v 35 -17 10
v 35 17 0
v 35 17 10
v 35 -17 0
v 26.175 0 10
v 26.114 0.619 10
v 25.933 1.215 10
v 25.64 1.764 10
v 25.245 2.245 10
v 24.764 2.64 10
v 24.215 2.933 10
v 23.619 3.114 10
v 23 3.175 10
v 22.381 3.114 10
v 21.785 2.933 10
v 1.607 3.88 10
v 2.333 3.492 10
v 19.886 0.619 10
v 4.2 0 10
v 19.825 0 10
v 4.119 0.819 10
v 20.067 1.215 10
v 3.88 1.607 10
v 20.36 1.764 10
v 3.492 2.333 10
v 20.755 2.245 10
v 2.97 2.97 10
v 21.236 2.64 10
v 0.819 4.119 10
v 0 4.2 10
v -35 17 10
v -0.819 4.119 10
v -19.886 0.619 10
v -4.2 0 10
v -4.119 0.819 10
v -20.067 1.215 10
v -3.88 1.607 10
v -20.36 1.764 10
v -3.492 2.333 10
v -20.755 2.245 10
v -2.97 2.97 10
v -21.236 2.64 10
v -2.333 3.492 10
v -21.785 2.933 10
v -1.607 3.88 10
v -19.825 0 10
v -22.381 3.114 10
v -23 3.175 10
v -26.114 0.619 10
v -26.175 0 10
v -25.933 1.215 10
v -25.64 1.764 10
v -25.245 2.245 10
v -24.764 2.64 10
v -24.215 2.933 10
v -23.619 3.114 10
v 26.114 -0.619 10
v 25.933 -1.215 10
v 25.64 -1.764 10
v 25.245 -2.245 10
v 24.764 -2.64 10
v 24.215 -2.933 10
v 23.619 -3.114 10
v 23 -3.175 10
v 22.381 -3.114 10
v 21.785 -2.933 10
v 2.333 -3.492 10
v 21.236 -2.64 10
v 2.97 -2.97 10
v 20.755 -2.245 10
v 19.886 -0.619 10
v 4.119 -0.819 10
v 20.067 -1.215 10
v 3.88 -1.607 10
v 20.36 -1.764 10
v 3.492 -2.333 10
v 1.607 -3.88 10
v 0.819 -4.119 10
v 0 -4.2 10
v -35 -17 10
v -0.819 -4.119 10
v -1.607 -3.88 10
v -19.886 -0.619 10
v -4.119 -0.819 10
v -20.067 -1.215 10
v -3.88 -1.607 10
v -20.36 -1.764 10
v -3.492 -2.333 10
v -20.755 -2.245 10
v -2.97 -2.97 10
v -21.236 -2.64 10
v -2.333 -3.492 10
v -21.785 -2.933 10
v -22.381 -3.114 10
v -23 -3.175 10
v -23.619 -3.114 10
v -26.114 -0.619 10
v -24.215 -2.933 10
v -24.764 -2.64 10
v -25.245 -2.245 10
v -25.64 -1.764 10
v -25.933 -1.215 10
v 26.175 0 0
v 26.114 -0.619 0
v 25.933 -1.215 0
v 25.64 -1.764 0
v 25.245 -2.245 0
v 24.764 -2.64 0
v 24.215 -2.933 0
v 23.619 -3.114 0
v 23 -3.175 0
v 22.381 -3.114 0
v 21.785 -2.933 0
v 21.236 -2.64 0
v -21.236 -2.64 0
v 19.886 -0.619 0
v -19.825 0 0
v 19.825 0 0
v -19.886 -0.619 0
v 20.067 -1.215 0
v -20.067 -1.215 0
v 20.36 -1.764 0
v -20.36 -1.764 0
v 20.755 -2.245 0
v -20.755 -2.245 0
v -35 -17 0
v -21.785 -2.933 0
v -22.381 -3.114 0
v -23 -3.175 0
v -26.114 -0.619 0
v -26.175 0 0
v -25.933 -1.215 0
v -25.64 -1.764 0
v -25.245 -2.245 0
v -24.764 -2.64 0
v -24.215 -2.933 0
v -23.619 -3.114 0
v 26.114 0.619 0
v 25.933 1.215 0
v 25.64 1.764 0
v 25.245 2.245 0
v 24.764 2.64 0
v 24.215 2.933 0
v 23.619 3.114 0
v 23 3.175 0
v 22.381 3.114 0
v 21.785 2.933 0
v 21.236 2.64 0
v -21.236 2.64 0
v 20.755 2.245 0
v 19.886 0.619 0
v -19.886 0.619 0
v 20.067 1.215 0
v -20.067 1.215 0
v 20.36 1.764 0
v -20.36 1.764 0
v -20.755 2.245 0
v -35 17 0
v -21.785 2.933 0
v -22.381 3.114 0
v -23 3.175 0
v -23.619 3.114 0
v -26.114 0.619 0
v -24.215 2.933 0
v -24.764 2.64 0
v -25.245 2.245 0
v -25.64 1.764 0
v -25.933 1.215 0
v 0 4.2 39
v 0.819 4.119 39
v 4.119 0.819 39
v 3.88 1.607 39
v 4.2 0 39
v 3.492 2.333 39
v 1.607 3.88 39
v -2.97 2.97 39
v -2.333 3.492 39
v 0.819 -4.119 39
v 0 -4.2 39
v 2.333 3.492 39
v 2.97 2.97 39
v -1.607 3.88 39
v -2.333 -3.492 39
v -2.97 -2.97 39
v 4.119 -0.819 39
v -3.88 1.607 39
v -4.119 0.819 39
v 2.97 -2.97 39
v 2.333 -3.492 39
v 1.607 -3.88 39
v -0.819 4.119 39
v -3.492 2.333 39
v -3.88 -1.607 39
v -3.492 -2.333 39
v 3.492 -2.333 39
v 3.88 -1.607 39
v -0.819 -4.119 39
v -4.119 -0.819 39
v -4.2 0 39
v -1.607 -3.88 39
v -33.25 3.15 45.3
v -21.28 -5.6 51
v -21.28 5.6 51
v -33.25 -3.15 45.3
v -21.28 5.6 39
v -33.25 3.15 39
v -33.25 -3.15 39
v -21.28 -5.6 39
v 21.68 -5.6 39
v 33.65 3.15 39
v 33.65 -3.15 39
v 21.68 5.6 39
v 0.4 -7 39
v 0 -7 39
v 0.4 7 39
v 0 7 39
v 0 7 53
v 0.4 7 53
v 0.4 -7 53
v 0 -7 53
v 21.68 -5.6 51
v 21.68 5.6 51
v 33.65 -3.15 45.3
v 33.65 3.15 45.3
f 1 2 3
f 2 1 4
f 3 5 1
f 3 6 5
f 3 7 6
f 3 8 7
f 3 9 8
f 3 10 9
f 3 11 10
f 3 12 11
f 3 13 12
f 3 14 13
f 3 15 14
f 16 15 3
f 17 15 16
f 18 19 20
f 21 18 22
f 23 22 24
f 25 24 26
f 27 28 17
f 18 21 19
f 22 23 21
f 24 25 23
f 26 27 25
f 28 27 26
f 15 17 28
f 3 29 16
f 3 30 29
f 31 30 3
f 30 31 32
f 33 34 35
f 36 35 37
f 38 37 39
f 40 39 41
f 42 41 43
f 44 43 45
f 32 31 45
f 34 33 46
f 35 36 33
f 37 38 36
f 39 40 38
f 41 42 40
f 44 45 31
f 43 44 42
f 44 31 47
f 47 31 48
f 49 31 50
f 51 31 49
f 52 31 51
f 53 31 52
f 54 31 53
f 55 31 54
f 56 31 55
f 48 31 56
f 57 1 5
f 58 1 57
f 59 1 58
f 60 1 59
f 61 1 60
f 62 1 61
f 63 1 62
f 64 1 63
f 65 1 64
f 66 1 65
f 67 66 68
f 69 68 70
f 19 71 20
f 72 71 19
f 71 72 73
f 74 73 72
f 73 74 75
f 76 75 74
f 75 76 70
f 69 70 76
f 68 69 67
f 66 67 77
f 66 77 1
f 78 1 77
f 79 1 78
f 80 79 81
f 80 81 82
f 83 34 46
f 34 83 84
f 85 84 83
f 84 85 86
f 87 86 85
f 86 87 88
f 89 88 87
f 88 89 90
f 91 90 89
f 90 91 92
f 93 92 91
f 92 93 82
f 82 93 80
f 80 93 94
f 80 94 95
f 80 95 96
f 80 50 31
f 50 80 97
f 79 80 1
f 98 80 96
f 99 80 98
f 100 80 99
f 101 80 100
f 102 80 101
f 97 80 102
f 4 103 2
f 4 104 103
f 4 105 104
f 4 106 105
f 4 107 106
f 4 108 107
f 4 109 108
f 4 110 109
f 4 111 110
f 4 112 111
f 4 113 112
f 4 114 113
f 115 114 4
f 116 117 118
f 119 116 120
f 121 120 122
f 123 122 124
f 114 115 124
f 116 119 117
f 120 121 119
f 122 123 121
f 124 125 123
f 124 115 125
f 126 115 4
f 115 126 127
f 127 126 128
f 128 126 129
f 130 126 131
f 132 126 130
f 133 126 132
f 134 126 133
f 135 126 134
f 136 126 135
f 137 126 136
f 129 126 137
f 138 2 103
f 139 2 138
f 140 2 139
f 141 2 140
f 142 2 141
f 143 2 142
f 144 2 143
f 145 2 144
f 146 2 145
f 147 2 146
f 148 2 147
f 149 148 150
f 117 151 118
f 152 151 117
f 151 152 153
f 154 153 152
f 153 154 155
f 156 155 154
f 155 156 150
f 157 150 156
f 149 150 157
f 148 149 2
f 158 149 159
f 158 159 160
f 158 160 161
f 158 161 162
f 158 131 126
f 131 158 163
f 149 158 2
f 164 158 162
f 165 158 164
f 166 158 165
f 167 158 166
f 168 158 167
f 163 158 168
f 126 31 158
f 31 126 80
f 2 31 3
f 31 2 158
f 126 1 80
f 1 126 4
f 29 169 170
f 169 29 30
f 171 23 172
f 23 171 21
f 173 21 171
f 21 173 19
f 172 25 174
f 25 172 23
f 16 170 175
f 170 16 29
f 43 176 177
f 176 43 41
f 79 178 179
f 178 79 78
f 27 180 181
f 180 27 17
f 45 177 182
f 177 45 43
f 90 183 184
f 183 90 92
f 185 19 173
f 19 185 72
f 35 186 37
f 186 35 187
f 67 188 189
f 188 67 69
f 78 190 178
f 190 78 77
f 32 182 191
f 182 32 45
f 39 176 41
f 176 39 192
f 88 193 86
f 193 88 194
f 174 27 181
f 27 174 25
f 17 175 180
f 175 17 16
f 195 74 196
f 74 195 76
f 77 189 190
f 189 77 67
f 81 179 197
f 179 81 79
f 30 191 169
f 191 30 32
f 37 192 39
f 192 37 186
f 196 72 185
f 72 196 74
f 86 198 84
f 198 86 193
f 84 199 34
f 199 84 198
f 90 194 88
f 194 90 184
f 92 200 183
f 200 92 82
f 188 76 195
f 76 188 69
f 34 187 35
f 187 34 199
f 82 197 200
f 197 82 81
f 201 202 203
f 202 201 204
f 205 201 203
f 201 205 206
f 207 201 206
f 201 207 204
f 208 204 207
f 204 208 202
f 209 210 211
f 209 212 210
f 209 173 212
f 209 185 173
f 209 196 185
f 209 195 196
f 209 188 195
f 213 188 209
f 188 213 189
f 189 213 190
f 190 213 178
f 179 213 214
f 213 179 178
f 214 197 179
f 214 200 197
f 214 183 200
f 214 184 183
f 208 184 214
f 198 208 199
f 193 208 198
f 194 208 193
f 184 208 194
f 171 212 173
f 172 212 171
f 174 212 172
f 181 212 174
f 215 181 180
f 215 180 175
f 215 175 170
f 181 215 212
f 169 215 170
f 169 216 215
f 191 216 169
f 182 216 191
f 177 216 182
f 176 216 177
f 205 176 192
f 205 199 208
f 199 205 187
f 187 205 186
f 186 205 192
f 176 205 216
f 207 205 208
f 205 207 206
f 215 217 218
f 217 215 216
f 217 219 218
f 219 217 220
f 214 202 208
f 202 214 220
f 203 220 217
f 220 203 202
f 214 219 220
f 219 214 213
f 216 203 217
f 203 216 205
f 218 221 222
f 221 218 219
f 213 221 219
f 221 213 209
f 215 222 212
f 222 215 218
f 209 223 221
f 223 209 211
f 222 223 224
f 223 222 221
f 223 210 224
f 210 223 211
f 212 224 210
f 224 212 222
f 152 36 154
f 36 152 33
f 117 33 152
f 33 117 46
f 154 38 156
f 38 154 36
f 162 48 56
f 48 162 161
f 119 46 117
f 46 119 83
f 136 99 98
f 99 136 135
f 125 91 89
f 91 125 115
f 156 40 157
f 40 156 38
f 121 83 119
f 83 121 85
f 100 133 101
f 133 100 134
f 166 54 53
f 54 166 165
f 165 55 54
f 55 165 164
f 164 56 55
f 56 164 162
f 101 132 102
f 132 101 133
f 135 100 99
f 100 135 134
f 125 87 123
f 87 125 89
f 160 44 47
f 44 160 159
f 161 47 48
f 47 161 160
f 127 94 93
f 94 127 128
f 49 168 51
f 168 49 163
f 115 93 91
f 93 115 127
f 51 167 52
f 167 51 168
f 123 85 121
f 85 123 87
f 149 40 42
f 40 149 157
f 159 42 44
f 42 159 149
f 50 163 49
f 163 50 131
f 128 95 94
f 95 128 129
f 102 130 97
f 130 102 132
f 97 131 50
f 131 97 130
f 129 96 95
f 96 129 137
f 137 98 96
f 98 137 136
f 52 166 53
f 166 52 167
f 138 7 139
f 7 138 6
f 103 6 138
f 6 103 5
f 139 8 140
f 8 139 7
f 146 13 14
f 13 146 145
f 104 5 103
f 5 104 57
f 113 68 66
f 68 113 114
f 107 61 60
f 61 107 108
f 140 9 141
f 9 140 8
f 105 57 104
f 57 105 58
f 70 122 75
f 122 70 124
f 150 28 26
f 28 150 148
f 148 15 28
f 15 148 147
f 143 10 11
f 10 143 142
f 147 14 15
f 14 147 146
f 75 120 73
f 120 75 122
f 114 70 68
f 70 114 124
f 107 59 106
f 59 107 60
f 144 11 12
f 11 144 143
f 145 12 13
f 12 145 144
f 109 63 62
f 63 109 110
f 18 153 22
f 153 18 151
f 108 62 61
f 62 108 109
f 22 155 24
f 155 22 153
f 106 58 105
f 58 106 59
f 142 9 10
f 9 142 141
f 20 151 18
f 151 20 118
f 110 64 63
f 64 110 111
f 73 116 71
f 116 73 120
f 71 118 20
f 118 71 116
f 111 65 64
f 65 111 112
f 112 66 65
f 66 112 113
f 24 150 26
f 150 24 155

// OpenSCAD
$fn = 32;

// ----------------------------------------------------------------------
// Boat cleat: 70 mm base, horn 46 mm up
// ----------------------------------------------------------------------

// --- parameters (mm) ---
base_l = 70;              // base length
base_w = 34;              // base width
base_t = 10;              // base thickness
horn_len = 66.5;          // horn length
horn_d = 14;              // horn diameter at the middle
horn_z = 46;              // horn axis height
end_drop = 8;             // how far the horn tips drop
post_d = 8.4;             // centre post diameter
holes_d = 6.35;           // fixing holes
hole_x = 23;              // fixing hole spacing

difference() {
  union() {
    translate([-35, -17, 0]) cube([base_l, base_w, base_t]);
    /* centre post, sunk 1 mm into the base */
    translate([0, 0, 9]) cylinder(h = 37, d = post_d);
    /* horn: a hull chain of boxes, full in the middle and lighter at the tips */
    hull() {
      translate([-33.25, -3.15, 39]) cube([0.4, 6.3, 6.3], center = false);
      translate([-21.28, -5.6, 39]) cube([0.4, 11.2, 12], center = false);
    }
    hull() {
      translate([-21.28, -5.6, 39]) cube([0.4, 11.2, 12], center = false);
      translate([0, -7, 39]) cube([0.4, 14, 14], center = false);
    }
    hull() {
      translate([0, -7, 39]) cube([0.4, 14, 14], center = false);
      translate([21.28, -5.6, 39]) cube([0.4, 11.2, 12], center = false);
    }
    hull() {
      translate([21.28, -5.6, 39]) cube([0.4, 11.2, 12], center = false);
      translate([33.25, -3.15, 39]) cube([0.4, 6.3, 6.3], center = false);
    }
  }
  translate([-23, 0, -2.5]) cylinder(h = base_t + 5, d = holes_d);
  translate([23, 0, -2.5]) cylinder(h = base_t + 5, d = holes_d);
}
